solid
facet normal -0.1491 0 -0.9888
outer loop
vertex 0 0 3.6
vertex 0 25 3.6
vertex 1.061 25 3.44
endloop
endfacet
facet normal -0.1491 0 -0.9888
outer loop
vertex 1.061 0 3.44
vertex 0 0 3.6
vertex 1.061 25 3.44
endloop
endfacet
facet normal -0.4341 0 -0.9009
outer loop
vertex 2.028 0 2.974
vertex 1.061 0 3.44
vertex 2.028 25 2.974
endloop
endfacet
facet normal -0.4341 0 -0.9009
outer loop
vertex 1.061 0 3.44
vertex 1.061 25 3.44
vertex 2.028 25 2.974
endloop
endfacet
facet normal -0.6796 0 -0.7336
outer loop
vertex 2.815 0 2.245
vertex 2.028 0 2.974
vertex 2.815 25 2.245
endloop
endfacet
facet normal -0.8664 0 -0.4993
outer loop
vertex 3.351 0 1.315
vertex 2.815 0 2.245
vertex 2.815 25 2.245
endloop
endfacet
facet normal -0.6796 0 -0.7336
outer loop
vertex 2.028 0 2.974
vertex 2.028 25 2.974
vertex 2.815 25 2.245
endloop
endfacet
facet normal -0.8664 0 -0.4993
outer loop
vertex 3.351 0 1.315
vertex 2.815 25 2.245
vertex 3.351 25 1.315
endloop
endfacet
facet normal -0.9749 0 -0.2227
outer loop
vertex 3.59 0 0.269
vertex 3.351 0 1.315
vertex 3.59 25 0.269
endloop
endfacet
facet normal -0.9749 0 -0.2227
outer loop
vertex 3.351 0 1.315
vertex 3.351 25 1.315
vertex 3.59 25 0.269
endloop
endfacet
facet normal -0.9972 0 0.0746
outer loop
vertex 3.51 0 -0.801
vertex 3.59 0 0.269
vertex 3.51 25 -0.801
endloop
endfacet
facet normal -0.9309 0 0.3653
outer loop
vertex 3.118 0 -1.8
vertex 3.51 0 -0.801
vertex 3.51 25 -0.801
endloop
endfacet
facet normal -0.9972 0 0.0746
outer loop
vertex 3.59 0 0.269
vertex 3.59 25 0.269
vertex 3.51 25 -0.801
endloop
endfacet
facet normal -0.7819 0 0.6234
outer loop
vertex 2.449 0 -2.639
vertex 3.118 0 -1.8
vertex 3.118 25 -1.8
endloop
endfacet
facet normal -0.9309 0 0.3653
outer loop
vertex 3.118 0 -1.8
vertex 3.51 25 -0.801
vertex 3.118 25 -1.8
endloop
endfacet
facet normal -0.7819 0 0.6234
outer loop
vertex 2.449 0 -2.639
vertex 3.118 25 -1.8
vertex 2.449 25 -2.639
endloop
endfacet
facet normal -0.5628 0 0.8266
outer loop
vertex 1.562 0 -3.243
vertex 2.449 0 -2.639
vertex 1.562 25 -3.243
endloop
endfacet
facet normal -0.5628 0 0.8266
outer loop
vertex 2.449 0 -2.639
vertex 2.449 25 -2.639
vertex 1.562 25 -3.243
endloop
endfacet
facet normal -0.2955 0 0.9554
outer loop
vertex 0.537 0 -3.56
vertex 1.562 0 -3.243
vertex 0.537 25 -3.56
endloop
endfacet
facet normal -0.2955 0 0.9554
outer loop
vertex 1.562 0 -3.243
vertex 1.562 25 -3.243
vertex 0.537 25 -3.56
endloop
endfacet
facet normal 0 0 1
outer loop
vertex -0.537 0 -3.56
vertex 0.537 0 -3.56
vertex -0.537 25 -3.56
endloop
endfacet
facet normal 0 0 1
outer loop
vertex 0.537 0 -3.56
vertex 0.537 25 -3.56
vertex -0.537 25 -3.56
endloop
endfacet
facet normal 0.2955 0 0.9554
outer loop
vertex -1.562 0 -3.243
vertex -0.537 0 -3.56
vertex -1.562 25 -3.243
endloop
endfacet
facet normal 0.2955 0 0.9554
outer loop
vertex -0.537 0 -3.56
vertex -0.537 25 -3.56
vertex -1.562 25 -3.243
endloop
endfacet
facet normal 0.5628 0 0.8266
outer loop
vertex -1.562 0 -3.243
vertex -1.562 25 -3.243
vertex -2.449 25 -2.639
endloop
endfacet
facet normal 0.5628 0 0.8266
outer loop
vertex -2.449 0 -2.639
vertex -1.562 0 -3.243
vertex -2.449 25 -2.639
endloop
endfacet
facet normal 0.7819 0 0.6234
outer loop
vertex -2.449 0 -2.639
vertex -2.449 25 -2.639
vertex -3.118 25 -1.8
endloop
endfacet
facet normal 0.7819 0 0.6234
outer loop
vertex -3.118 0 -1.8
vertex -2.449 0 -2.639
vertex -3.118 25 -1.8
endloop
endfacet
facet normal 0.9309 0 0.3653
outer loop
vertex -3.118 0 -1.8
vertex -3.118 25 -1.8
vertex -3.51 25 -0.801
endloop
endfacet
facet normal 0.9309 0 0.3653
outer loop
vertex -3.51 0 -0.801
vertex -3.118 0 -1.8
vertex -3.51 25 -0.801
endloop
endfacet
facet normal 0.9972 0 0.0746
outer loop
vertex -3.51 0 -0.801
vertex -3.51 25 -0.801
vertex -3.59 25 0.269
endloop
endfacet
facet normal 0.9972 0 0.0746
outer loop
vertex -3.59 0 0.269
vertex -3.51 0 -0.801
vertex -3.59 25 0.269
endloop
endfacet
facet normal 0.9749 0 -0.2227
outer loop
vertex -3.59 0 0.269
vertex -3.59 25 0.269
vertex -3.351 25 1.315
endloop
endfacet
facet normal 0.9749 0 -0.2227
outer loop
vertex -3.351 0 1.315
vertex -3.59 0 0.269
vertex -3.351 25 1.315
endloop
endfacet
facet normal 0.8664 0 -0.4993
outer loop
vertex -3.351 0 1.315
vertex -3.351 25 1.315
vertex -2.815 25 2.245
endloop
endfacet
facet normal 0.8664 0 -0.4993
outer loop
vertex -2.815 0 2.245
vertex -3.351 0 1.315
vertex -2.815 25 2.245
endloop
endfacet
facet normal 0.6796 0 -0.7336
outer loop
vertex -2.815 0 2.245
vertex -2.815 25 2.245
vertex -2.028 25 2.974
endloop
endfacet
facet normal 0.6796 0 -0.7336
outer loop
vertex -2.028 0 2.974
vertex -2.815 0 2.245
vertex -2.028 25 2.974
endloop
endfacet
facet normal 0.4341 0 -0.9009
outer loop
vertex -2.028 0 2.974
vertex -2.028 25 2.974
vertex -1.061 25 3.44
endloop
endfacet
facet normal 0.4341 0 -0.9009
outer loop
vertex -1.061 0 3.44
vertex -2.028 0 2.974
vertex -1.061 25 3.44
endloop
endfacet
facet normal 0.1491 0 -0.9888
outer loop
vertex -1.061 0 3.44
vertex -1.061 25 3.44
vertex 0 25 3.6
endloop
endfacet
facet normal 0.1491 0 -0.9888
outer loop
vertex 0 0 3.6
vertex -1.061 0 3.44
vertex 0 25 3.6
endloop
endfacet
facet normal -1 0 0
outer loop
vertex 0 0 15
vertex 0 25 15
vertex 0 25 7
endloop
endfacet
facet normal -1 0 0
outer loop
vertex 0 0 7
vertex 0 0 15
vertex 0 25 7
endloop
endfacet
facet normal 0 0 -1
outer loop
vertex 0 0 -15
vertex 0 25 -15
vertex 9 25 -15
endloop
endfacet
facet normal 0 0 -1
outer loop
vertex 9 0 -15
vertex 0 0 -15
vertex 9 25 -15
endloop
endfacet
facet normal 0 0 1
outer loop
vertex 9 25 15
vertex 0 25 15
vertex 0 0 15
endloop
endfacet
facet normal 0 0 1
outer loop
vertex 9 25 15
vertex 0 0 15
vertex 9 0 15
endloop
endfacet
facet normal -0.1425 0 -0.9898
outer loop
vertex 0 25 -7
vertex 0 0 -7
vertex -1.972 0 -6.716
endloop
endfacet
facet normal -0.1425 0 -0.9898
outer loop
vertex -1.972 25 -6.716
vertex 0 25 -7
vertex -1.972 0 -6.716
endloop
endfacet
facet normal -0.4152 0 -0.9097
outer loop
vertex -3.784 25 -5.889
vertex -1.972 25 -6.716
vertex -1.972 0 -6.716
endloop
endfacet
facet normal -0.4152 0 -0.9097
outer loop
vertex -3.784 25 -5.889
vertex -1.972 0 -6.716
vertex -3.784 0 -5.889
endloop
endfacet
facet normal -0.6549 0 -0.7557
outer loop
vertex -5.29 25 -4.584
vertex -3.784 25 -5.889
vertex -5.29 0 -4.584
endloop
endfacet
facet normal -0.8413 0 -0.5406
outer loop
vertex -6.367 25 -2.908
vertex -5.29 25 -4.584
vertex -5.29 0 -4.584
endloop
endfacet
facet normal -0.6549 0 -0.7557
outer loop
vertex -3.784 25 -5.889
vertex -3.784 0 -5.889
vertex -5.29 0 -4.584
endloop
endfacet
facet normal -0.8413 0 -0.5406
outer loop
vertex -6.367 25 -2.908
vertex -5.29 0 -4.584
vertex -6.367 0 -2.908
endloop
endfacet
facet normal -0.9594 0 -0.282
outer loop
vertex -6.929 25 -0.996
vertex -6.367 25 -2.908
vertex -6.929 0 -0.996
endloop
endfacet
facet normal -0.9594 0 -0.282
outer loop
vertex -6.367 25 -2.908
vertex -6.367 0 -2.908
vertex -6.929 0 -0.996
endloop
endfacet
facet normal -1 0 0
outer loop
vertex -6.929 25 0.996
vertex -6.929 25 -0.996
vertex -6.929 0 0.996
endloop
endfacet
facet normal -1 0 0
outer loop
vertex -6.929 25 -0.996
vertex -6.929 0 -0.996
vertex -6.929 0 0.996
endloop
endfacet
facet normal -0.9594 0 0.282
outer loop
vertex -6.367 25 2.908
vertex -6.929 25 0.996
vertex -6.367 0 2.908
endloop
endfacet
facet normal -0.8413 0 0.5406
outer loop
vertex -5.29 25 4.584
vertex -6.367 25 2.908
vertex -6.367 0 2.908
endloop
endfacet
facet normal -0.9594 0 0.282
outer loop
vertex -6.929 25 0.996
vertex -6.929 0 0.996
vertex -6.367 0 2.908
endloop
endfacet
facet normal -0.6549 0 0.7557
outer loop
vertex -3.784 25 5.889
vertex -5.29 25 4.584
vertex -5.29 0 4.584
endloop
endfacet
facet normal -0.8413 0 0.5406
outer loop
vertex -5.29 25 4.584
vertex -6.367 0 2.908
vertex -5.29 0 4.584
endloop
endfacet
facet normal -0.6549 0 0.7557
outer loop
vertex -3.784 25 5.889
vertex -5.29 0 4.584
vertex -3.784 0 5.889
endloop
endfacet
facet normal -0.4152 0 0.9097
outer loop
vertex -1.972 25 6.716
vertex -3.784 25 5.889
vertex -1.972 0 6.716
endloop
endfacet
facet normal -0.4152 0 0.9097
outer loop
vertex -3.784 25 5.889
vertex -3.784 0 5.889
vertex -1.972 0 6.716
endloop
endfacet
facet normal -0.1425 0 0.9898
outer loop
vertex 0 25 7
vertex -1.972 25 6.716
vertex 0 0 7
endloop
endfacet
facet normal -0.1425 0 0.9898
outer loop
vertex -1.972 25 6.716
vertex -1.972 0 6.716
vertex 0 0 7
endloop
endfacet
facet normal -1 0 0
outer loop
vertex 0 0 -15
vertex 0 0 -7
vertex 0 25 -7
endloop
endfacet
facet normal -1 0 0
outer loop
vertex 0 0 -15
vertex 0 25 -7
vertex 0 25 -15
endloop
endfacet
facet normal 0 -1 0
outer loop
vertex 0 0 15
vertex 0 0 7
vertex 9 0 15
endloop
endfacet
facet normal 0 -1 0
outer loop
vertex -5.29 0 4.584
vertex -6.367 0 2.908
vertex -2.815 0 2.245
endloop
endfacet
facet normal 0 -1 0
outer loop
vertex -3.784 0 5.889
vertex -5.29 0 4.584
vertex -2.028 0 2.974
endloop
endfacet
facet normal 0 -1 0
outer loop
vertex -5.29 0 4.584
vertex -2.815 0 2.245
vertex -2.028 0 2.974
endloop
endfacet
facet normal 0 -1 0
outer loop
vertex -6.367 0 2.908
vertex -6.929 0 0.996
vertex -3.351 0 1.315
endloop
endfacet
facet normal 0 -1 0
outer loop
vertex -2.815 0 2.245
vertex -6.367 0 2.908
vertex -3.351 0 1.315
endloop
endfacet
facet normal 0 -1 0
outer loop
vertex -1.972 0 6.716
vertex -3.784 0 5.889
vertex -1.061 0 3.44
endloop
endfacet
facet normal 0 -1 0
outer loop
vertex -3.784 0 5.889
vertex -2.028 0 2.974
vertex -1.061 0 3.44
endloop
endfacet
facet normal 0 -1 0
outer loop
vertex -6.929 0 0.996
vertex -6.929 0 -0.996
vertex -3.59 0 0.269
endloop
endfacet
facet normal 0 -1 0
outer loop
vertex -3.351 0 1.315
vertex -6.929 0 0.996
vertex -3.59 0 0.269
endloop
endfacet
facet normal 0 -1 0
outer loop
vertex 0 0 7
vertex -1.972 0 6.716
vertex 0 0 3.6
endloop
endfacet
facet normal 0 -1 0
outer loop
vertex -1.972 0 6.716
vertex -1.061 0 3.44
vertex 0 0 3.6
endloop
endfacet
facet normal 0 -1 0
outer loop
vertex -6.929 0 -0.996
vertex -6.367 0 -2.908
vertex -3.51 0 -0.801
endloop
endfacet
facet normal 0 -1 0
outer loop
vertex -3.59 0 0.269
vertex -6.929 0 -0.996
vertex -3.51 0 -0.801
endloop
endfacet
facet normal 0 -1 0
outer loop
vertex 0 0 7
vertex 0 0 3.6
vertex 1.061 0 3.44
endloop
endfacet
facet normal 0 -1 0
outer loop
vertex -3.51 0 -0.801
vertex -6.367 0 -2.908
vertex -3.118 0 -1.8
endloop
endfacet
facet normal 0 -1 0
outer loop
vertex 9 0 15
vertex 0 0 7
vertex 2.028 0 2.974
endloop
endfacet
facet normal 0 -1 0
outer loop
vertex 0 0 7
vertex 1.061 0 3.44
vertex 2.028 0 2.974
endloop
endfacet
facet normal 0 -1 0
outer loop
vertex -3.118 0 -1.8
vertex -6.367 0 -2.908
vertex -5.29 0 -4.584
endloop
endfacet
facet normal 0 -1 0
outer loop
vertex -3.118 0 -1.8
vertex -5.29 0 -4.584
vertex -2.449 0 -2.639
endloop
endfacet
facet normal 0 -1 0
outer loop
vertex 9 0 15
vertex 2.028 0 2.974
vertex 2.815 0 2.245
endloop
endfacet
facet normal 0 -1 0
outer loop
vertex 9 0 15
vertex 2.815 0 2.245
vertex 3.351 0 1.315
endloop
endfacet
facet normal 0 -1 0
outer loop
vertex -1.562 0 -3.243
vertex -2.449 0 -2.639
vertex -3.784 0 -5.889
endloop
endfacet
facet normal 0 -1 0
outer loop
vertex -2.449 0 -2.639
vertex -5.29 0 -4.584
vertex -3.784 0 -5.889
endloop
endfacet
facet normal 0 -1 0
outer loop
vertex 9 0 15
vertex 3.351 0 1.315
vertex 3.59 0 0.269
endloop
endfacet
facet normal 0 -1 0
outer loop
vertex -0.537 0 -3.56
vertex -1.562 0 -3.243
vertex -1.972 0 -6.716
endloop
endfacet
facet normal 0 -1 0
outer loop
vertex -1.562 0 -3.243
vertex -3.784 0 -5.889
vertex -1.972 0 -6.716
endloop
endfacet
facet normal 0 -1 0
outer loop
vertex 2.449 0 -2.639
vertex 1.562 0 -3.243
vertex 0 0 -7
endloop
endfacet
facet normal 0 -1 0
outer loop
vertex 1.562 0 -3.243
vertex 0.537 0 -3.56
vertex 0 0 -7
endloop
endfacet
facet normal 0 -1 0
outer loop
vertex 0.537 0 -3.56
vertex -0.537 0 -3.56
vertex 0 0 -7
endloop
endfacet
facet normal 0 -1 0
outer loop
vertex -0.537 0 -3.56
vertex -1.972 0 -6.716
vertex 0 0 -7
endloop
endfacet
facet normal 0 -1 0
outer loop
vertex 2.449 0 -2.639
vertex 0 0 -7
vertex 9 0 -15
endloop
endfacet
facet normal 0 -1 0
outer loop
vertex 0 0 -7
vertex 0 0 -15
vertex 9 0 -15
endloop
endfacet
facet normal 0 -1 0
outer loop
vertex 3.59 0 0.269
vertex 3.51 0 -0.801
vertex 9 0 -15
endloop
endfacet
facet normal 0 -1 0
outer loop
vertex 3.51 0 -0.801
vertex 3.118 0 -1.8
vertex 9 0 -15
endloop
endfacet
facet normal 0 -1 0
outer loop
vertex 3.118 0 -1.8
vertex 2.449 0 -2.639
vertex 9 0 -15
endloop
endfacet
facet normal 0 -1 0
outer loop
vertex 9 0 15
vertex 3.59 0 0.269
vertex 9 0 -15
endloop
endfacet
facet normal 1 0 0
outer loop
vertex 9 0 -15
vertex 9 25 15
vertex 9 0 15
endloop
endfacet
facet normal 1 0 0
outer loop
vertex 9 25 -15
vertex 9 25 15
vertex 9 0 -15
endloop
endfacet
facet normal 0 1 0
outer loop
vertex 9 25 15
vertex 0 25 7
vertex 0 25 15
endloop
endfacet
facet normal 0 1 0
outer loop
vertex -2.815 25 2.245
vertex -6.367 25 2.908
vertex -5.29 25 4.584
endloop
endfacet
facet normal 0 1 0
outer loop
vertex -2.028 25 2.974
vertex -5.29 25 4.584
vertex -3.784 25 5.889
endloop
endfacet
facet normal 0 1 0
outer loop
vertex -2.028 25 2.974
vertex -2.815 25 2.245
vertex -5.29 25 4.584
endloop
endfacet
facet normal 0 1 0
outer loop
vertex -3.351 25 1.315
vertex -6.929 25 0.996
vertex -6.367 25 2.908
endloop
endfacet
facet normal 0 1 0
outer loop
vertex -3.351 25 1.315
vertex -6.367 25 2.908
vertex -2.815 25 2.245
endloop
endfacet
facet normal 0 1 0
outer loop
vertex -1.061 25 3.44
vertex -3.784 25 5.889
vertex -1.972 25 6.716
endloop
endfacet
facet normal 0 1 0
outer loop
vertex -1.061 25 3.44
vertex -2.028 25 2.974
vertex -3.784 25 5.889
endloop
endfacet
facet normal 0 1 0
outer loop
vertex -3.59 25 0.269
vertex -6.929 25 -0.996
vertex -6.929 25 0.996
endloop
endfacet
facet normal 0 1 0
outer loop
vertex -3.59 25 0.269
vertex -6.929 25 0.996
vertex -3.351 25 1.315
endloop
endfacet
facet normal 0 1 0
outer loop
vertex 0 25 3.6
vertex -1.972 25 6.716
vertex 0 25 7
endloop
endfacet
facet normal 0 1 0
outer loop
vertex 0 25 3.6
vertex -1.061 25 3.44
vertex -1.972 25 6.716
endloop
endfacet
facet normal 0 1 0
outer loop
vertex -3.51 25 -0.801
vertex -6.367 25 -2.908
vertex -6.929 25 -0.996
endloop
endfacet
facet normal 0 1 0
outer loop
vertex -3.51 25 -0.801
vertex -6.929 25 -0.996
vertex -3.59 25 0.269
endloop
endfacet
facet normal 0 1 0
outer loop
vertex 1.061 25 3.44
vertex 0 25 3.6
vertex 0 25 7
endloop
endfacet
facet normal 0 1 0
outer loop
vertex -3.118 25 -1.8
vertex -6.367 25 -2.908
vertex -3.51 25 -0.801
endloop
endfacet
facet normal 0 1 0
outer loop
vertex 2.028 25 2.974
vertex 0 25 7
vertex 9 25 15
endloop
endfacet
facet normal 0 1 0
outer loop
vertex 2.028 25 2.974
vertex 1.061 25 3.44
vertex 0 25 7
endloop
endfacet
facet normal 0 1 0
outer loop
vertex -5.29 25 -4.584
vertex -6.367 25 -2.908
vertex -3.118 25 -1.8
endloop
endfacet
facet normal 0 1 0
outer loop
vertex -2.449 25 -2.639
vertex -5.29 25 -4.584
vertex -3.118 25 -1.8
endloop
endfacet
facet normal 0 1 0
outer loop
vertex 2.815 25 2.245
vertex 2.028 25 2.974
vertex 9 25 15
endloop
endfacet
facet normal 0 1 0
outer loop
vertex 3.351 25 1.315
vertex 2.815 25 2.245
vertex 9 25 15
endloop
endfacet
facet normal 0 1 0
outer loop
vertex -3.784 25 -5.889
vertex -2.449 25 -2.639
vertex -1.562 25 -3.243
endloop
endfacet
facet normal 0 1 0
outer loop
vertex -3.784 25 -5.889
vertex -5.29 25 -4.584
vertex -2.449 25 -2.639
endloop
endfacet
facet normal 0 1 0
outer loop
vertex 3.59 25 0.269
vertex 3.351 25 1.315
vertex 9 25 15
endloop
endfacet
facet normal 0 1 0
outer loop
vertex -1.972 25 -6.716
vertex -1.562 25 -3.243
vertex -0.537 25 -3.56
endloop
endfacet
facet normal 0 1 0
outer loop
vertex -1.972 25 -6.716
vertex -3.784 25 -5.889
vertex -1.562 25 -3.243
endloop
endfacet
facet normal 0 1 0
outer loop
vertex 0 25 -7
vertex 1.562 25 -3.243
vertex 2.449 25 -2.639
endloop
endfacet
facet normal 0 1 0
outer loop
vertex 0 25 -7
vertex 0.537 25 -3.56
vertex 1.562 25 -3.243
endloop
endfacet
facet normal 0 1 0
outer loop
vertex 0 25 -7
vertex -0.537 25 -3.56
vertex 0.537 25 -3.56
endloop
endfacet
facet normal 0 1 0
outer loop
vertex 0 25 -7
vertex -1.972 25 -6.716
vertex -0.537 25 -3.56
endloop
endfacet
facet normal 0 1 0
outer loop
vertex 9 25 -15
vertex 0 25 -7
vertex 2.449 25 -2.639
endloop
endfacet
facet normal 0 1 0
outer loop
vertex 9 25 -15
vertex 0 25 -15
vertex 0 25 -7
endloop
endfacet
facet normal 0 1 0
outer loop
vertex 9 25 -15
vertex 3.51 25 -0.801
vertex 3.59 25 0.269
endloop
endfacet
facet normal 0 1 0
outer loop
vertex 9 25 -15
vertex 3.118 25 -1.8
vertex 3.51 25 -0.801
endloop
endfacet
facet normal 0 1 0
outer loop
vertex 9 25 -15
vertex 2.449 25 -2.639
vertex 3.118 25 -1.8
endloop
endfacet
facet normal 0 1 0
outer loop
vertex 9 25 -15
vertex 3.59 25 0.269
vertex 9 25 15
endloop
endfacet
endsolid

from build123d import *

# Parameters (mm, degrees)
SKETCH1_R           = 7
BOSS_EXTRUDE1_DEPTH = 25
SKETCH2_W           = 9
SKETCH2_H           = 30
BOSS_EXTRUDE2_DEPTH = 25
SKETCH3_R           = 3.6
CUT_EXTRUDE1_DEPTH  = 31.512292605


with BuildPart() as part:
    # Sketch1 → Boss-Extrude1 (new body)
    with BuildSketch(Plane(origin=(0, 0, 0), x_dir=(1, 0, 0), z_dir=(0, 1, 0))):
        Circle(SKETCH1_R)
    extrude(amount=BOSS_EXTRUDE1_DEPTH)

    # Sketch2 → Boss-Extrude2 (add)
    with BuildSketch(Plane(origin=(0, 25, 0), x_dir=(1, 0, 0), z_dir=(0, 1, 0))):
        with Locations((4.5, 0)):
            Rectangle(SKETCH2_W, SKETCH2_H)
    extrude(amount=-BOSS_EXTRUDE2_DEPTH)

    # Sketch3 → Cut-Extrude1 (cut, through all)
    with BuildSketch(Plane(origin=(0, 25, 0), x_dir=(1, 0, 0), z_dir=(0, 1, 0))):
        Circle(SKETCH3_R)
    extrude(amount=-CUT_EXTRUDE1_DEPTH, mode=Mode.SUBTRACT)


solid = part.part
